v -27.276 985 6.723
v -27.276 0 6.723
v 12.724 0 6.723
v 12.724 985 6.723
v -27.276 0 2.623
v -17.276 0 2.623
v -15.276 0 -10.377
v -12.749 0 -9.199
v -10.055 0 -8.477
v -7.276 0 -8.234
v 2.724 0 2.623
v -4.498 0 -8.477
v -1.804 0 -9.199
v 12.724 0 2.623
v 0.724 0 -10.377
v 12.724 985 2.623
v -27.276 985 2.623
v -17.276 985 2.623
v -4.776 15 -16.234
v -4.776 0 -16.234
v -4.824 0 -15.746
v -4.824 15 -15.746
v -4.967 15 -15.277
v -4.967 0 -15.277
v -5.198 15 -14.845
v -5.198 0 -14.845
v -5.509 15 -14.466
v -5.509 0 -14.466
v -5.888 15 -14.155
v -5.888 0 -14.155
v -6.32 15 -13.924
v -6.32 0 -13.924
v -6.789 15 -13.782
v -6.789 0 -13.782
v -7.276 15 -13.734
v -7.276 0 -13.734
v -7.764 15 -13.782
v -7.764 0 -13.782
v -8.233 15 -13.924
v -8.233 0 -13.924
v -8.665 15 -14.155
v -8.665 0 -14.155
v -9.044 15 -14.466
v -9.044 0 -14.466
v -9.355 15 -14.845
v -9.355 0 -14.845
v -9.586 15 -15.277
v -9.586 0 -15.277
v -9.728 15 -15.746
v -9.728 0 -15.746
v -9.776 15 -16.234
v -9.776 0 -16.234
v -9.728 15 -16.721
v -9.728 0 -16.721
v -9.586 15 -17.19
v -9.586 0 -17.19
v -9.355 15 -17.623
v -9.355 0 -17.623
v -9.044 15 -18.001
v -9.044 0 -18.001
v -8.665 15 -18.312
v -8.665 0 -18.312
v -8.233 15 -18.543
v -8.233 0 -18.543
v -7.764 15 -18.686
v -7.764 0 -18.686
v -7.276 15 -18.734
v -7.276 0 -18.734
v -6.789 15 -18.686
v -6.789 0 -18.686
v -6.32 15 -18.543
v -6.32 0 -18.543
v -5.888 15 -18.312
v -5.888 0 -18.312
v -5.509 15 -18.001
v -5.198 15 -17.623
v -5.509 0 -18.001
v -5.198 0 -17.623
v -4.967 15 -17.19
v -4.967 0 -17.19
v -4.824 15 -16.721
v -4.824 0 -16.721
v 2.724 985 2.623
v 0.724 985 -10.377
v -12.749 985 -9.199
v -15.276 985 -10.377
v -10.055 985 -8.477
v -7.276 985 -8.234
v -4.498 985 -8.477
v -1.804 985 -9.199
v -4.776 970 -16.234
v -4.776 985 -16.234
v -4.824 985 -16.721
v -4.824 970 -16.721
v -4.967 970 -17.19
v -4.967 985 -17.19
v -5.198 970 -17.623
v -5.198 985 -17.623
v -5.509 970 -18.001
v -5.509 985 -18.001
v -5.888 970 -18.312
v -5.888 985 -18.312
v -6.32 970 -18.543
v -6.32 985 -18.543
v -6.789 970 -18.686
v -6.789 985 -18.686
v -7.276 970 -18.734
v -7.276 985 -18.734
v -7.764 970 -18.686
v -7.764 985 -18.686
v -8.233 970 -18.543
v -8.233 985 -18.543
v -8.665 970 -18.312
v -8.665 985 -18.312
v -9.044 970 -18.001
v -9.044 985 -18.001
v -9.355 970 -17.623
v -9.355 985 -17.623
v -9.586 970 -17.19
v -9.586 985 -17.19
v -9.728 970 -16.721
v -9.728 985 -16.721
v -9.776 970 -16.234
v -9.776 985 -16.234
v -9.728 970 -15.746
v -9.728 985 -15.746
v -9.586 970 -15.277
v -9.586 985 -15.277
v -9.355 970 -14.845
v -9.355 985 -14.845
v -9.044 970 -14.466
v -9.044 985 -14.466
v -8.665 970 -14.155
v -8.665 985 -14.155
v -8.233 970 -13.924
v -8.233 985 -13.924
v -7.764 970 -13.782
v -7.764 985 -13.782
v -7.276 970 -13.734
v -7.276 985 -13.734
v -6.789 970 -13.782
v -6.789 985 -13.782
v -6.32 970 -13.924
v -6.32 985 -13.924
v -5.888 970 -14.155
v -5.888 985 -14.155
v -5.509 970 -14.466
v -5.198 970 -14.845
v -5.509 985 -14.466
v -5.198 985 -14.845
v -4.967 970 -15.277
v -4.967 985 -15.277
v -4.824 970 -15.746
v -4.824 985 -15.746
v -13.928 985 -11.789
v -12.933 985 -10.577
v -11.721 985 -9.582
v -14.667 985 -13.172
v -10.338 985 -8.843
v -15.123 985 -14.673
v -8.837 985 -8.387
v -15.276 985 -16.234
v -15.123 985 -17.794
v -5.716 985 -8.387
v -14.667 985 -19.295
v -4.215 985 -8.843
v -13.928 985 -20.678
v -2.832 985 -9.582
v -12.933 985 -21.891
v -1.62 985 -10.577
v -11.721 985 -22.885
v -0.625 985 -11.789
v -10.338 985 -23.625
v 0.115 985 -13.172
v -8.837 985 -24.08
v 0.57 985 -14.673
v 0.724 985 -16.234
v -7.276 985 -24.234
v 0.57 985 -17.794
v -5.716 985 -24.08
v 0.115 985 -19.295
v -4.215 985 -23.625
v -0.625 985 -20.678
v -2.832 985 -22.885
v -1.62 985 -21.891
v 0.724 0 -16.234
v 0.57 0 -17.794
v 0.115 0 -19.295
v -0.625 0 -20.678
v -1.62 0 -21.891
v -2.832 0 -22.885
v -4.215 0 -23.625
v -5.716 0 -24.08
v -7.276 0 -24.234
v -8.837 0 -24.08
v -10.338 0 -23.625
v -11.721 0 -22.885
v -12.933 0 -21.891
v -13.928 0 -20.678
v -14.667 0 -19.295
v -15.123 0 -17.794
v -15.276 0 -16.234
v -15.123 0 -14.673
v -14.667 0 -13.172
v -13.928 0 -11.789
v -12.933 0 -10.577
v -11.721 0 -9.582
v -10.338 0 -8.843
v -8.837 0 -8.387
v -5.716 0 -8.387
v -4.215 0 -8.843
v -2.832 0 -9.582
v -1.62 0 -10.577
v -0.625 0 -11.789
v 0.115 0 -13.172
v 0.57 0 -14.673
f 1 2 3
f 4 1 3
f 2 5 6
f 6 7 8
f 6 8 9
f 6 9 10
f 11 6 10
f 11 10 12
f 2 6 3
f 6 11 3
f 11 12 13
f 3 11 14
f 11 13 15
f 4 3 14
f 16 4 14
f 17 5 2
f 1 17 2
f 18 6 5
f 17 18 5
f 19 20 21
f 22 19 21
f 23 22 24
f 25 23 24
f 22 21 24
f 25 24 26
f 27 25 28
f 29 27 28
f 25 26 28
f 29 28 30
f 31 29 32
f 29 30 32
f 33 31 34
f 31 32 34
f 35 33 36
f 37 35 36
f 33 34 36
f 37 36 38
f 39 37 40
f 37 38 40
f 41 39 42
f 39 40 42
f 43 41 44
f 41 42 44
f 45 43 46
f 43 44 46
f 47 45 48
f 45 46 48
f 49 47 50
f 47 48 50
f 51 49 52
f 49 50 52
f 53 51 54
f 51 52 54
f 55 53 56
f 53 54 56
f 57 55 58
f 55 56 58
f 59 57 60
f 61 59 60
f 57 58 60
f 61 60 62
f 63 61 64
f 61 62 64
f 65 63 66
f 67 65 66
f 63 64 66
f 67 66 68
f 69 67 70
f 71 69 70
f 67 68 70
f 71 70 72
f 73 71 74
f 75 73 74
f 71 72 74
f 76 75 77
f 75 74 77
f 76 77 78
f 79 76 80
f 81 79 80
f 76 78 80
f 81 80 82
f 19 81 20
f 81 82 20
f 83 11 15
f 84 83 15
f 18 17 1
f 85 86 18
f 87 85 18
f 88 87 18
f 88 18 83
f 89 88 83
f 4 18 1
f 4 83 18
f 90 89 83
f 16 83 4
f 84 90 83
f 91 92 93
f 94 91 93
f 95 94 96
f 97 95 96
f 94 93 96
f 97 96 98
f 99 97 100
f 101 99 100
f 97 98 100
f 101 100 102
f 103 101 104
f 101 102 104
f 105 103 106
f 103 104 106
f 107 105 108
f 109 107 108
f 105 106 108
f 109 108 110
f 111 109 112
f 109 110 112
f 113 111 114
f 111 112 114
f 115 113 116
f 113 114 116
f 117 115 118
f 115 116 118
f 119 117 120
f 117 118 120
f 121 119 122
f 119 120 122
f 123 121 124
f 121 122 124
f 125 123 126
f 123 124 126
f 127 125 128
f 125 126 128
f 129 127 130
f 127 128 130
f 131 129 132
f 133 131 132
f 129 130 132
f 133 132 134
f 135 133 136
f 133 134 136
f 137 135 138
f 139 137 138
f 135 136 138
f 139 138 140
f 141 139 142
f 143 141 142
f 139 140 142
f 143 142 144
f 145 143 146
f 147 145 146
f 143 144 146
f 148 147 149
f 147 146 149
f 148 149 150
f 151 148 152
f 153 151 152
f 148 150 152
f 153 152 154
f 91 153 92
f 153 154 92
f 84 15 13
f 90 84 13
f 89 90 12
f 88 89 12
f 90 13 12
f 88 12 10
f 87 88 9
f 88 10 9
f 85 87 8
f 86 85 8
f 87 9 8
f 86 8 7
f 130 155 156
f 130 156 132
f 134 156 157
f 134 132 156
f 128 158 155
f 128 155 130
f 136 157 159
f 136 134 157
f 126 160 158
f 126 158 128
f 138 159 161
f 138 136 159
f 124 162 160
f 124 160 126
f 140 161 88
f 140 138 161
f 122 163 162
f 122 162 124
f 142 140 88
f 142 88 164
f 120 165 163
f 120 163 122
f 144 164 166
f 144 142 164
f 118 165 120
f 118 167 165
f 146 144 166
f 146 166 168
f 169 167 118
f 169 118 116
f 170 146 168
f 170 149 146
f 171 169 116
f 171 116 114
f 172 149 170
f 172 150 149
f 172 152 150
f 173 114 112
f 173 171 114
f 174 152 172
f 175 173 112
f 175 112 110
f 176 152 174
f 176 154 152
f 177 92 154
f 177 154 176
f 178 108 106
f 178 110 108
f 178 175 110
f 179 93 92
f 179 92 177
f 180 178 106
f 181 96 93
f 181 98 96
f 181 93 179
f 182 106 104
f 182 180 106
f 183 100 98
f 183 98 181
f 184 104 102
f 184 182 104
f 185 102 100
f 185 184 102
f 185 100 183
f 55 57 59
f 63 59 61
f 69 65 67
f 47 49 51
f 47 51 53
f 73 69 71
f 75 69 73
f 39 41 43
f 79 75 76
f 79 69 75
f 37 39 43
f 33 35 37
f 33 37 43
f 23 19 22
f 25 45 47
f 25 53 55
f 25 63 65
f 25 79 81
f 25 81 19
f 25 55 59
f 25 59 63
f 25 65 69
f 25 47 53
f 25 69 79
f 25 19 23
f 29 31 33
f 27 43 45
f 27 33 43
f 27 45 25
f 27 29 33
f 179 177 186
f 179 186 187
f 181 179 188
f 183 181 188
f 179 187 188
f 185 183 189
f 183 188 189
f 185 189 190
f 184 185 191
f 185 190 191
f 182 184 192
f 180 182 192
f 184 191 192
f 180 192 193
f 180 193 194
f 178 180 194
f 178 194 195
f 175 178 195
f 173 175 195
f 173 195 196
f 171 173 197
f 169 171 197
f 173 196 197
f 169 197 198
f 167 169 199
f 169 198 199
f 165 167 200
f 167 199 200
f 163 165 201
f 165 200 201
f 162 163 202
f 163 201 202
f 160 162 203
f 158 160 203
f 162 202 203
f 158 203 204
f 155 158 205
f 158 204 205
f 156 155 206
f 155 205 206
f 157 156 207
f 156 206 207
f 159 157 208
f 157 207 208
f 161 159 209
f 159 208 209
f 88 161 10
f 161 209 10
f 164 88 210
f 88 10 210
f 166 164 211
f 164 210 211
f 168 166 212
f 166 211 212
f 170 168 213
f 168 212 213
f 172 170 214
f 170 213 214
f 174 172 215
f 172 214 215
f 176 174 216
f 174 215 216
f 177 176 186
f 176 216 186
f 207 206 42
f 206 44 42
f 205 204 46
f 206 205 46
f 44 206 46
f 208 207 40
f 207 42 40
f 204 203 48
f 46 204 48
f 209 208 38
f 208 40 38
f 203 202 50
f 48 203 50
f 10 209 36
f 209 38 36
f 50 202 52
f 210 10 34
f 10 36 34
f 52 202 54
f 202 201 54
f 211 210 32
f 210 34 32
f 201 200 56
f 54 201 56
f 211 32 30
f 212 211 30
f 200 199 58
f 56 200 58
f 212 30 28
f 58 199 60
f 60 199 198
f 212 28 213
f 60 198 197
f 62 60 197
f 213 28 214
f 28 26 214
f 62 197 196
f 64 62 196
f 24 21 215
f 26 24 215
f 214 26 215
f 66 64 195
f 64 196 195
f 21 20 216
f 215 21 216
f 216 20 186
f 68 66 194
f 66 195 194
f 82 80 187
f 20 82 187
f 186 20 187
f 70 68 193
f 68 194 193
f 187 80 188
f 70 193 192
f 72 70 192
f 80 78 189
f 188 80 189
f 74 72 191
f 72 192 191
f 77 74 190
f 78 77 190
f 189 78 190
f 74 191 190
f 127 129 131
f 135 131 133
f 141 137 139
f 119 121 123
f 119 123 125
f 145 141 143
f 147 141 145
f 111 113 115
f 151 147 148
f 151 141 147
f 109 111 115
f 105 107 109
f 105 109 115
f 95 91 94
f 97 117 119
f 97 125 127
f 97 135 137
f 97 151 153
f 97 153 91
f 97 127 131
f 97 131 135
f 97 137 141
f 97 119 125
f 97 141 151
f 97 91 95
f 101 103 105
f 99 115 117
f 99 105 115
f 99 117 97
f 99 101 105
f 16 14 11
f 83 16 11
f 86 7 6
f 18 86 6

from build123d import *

# Parameters (mm, degrees)
CROQUIS2_R                = 8
SALIENTE_EXTRUIR1_DEPTH   = 985
SALIENTE_EXTRUIR1_2_DEPTH = 985
CROQUIS3_R                = 2.5
CORTAR_EXTRUIR1_DEPTH     = 15
CROQUIS4_R                = 2.5
CORTAR_EXTRUIR2_DEPTH     = 15


with BuildPart() as part:
    # Croquis2 → Saliente-Extruir1 (new body)
    with BuildSketch(Plane(origin=(0, 0, 0), x_dir=(1, 0, 0), z_dir=(0, 1, 0))):
        with Locations((-7.276441578, 16.233656664)):
            Circle(CROQUIS2_R)
    extrude(amount=SALIENTE_EXTRUIR1_DEPTH)

    # Croquis3 → Cortar-Extruir1 (cut)
    with BuildSketch(Plane.XZ):
        with Locations((-7.276441578, -16.233656664)):
            Circle(CROQUIS3_R)
    extrude(amount=-CORTAR_EXTRUIR1_DEPTH, mode=Mode.SUBTRACT)

    # Croquis4 → Cortar-Extruir2 (cut)
    with BuildSketch(Plane(origin=(0, 985, 0), x_dir=(1, 0, 0), z_dir=(0, 1, 0))):
        with Locations((-7.276441578, 16.233656664)):
            Circle(CROQUIS4_R)
    extrude(amount=-CORTAR_EXTRUIR2_DEPTH, mode=Mode.SUBTRACT)


with BuildPart() as body_2:
    # Croquis2 → Saliente-Extruir1 2 (new body)
    with BuildSketch(Plane(origin=(0, 0, 0), x_dir=(1, 0, 0), z_dir=(0, 1, 0))):
        with BuildLine():
            Line((-27.276441578, -6.722749797), (10.823558422, -6.722749797))
            Line((10.823558422, -6.722749797), (12.723558422, -6.722749797))
            Line((12.723558422, -6.722749797), (12.723558422, -2.622749797))
            Line((12.723558422, -2.622749797), (2.723558422, -2.622749797))
            Line((2.723558422, -2.622749797), (0.723558422, 10.377250203))
            ThreePointArc((0.723558422, 10.377250203), (-7.276441578, 8.233656664), (-15.276441578, 10.377250203))
            Line((-15.276441578, 10.377250203), (-17.276441578, -2.622749797))
            Line((-17.276441578, -2.622749797), (-27.276441578, -2.622749797))
            Line((-27.276441578, -2.622749797), (-27.276441578, -6.722749797))
        make_face()
    extrude(amount=SALIENTE_EXTRUIR1_2_DEPTH)


solid = Compound([part.part, body_2.part])
